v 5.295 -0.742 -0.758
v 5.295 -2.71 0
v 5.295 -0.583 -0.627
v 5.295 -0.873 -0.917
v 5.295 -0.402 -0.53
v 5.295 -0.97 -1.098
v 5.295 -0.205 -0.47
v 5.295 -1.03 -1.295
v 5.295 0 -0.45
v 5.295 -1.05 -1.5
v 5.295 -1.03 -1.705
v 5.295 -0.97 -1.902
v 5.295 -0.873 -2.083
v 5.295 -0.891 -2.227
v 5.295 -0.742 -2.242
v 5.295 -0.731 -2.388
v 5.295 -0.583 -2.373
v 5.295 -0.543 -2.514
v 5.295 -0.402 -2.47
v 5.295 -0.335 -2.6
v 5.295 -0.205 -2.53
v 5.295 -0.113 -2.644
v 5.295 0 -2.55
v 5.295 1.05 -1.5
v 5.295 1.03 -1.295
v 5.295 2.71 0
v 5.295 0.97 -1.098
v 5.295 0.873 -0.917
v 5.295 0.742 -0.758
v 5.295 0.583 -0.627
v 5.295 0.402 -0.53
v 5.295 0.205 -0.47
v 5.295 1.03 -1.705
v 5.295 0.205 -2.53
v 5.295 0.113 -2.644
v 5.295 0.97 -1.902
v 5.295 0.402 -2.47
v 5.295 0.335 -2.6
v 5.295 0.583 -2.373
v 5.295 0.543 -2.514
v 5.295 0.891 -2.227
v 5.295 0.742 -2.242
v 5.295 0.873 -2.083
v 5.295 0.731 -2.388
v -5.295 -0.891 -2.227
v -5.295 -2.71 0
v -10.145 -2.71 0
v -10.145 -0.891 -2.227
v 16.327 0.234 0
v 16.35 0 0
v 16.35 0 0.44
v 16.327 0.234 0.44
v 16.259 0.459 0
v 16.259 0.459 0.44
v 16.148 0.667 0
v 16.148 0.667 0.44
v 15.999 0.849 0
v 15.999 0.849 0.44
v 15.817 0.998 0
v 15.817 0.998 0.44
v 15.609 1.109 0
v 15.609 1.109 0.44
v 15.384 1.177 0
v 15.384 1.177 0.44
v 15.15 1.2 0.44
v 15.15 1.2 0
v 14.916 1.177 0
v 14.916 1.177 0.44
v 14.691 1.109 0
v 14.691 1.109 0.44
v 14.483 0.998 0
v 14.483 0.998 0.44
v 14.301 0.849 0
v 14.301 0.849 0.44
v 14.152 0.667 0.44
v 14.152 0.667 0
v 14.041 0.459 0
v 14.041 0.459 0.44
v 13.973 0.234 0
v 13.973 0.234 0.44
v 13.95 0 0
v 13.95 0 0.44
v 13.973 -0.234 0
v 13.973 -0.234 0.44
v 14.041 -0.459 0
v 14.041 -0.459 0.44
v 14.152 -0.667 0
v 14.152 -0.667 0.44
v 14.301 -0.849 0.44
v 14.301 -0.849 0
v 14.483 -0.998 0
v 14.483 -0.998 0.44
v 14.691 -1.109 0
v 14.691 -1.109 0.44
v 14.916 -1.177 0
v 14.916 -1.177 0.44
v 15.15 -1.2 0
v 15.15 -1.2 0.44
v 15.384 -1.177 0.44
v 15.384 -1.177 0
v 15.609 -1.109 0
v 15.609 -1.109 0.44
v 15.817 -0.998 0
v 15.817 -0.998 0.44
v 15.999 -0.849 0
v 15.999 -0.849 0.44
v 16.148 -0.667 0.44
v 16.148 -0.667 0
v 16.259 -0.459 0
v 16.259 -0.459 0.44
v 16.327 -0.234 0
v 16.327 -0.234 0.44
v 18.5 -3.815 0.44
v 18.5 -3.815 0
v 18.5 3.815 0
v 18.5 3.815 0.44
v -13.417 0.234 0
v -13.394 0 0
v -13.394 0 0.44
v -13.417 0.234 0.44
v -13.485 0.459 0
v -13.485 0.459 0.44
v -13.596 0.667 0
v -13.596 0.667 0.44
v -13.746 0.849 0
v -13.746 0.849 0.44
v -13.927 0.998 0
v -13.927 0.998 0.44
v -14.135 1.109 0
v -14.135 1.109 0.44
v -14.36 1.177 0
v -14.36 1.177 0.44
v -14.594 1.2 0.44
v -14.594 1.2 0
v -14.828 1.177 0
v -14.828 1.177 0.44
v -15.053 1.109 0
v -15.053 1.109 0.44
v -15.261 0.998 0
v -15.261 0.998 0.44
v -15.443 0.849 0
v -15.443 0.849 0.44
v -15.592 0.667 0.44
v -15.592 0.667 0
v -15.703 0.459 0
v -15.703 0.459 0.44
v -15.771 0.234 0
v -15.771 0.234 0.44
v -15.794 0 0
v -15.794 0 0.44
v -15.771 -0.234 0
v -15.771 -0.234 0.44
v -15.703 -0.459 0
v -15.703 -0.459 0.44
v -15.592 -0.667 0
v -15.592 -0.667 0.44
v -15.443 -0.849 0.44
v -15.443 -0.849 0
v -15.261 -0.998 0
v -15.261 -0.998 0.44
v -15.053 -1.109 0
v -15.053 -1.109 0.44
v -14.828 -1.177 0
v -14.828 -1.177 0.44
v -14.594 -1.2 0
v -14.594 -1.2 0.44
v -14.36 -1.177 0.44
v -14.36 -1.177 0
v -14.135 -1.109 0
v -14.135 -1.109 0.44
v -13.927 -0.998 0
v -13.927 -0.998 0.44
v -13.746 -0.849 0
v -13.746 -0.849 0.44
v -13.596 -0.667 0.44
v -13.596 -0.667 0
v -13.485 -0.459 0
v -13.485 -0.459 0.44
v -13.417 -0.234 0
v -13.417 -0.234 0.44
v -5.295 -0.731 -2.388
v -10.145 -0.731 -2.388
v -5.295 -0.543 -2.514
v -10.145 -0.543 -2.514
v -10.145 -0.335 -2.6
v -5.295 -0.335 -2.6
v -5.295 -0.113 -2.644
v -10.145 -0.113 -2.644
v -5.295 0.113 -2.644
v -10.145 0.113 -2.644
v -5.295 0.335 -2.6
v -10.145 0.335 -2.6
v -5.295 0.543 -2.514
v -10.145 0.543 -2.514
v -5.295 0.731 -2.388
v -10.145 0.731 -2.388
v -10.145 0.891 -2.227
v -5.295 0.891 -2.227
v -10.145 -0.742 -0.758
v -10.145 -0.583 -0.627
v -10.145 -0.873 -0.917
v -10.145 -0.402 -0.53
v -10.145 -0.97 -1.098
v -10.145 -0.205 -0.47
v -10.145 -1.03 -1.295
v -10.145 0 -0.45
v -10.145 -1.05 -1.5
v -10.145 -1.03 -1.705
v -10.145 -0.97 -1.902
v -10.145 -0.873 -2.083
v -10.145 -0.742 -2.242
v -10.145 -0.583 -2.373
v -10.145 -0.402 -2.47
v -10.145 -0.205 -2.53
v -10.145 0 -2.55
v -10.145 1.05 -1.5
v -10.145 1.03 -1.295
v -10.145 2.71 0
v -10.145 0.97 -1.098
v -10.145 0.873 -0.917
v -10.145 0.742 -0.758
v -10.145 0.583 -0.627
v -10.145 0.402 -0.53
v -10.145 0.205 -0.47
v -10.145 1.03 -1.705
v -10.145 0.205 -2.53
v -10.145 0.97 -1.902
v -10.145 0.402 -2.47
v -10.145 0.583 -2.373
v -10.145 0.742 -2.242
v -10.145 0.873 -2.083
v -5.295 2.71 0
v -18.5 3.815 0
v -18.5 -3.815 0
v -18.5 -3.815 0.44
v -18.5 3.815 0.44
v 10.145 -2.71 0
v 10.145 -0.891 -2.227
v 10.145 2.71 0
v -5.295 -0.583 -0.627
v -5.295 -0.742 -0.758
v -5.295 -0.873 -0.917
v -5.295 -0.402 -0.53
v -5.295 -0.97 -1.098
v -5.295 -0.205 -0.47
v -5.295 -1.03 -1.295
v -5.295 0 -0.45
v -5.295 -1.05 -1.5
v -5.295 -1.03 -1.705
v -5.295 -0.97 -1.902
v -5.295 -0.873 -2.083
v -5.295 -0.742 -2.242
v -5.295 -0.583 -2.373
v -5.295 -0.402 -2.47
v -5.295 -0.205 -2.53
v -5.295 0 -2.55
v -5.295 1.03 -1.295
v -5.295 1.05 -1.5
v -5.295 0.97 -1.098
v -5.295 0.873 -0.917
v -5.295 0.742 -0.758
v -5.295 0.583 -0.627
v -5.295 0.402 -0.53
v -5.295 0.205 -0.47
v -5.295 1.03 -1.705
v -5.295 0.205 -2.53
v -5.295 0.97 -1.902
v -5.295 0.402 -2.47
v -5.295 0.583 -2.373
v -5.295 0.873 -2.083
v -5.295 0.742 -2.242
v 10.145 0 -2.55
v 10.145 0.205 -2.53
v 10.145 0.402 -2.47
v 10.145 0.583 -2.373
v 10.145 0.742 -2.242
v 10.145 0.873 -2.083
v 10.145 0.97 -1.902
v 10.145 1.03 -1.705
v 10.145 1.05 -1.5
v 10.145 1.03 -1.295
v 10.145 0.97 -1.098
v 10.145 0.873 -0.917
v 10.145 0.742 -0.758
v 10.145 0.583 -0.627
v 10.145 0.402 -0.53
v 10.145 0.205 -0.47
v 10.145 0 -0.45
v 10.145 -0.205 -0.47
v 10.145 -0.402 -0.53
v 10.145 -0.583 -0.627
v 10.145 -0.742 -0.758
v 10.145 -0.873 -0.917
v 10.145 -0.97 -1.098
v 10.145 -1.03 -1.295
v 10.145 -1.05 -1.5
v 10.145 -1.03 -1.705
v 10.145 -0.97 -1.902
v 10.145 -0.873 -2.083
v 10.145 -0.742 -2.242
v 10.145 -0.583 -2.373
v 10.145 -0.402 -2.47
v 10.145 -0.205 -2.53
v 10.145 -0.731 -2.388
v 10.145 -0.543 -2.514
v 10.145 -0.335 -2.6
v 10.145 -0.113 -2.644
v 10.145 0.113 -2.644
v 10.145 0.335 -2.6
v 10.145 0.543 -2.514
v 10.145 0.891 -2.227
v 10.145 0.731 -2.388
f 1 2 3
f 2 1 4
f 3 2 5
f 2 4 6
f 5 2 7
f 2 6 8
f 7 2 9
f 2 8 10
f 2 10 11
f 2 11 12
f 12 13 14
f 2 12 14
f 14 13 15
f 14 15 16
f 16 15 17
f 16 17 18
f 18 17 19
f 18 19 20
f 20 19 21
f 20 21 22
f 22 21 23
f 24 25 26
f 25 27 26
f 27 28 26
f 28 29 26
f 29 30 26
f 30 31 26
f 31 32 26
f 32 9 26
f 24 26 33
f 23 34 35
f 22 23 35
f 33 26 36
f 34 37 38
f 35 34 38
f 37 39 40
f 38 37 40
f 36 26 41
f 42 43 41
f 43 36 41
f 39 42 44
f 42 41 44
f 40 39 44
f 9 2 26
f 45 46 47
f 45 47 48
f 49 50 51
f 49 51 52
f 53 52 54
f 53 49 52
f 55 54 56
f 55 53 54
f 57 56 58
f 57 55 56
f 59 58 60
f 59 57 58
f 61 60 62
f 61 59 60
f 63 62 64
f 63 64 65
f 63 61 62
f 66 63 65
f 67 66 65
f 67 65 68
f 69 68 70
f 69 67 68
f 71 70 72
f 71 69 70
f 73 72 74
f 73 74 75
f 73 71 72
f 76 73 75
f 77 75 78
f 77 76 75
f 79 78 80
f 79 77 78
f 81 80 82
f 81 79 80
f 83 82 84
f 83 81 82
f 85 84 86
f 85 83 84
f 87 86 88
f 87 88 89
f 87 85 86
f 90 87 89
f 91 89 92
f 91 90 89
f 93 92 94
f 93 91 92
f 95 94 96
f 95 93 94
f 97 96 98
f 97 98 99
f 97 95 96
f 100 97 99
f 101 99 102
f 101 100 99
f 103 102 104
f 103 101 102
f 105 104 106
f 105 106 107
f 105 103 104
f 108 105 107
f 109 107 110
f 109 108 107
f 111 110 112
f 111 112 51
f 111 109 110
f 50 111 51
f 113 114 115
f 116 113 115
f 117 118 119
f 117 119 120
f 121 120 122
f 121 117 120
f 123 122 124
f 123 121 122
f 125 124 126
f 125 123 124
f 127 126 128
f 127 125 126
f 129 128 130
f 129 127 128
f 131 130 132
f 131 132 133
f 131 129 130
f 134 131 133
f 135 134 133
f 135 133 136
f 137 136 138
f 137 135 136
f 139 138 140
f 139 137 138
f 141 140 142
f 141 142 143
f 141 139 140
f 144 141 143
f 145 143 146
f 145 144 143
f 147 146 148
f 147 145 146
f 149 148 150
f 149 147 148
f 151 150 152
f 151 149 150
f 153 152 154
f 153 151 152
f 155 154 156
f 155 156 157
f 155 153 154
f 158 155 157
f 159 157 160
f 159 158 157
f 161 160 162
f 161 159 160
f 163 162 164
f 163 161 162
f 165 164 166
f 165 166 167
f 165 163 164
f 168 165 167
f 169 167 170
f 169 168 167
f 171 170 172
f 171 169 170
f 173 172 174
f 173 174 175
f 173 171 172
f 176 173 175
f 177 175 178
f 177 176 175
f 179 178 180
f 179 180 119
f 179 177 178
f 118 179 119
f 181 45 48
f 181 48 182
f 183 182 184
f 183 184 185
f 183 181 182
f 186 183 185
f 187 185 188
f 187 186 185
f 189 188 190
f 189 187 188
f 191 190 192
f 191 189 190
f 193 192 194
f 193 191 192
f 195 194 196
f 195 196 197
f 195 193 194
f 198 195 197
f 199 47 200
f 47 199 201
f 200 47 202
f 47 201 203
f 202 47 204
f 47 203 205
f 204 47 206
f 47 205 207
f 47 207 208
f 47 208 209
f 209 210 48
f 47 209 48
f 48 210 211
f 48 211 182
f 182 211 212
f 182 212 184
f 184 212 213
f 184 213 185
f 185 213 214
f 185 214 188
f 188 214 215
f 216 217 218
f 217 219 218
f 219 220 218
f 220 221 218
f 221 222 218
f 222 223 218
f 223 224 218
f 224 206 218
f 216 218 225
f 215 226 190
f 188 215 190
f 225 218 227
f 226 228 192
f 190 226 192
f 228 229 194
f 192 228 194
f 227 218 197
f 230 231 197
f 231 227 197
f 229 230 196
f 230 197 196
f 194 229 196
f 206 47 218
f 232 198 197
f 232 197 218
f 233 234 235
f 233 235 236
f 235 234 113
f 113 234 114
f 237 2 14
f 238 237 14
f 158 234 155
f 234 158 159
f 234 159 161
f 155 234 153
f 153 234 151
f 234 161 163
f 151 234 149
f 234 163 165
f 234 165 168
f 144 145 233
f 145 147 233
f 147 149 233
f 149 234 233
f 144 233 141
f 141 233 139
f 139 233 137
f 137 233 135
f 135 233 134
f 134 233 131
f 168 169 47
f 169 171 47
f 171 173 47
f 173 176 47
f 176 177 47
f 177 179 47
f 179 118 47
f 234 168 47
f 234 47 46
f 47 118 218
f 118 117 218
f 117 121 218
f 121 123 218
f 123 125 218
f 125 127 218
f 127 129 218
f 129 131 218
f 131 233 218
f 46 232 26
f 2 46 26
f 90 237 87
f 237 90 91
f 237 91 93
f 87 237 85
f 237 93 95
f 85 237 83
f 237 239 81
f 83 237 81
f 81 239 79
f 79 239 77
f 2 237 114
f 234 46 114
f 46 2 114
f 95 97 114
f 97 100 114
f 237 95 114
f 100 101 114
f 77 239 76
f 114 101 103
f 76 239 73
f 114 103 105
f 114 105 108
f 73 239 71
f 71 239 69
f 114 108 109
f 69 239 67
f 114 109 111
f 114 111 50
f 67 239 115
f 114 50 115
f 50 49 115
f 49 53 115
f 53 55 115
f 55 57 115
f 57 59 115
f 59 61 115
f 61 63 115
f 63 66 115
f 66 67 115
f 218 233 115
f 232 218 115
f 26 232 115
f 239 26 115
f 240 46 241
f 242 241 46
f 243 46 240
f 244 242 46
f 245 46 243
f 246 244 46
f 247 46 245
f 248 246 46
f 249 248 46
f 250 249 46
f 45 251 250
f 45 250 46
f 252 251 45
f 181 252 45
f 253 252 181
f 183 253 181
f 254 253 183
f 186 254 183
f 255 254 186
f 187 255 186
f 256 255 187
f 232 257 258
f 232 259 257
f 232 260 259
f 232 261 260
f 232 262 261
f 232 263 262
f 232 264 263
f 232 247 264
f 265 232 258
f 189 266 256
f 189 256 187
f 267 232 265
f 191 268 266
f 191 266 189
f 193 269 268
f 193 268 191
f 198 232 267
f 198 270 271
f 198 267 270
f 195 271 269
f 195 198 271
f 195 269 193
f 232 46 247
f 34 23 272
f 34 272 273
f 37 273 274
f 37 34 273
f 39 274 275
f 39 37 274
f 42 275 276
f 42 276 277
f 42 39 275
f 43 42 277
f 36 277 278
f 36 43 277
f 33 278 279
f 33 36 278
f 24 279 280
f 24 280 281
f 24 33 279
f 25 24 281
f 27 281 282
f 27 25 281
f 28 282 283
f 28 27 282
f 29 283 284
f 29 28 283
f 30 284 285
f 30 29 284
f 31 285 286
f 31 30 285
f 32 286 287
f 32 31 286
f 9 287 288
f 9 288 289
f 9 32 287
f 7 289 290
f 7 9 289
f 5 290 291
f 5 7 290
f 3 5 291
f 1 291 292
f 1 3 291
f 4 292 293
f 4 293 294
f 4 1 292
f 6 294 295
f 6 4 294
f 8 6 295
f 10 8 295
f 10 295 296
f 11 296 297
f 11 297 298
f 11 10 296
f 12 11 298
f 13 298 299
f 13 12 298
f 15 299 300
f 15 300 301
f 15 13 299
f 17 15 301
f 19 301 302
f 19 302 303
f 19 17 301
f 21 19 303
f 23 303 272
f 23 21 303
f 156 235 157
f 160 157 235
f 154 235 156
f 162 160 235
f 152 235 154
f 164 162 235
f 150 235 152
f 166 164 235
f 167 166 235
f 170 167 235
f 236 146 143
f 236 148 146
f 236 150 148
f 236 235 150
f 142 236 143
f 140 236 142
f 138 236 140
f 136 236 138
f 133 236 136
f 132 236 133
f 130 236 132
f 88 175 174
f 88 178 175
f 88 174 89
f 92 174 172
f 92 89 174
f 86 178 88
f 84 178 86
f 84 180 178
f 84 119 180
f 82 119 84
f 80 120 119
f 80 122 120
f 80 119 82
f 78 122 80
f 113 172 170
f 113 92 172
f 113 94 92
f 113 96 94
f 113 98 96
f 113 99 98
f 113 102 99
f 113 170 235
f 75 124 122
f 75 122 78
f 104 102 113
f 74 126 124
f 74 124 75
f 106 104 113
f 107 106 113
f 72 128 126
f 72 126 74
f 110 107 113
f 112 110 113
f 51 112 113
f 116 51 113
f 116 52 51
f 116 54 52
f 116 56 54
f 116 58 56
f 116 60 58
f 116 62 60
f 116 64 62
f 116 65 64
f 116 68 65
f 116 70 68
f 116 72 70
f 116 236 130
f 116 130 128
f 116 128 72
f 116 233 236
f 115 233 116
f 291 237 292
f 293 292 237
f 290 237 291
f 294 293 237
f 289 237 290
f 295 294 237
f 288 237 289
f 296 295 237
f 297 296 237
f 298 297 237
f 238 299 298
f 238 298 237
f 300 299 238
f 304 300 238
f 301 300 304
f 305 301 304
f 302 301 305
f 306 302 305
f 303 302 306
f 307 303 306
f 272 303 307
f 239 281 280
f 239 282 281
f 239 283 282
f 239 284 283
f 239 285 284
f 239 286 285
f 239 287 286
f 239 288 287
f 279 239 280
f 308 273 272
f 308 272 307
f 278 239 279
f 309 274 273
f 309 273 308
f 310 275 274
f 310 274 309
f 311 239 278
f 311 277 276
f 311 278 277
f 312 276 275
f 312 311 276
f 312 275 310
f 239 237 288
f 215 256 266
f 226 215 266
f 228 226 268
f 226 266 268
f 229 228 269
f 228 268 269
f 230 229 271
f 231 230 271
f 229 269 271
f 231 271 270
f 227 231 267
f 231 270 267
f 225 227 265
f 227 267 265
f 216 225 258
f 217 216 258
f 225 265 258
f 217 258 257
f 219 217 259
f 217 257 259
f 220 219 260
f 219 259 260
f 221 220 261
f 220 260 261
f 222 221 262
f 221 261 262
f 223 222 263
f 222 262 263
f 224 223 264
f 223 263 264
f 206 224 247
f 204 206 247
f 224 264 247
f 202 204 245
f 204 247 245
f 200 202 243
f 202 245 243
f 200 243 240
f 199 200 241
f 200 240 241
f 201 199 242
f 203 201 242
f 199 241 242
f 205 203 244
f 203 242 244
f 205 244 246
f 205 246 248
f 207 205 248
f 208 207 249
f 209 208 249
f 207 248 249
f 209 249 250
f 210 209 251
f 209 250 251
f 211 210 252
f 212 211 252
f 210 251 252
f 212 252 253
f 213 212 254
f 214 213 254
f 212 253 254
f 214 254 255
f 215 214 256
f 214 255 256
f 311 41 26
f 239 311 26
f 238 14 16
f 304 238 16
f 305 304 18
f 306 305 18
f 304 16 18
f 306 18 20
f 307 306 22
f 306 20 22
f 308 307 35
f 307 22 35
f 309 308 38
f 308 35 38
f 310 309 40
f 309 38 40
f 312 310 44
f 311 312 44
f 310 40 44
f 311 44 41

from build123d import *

# Parameters (mm, degrees)
SKETCH1_W           = 37
SKETCH1_H           = 7.63
SKETCH1_R           = 1.2
BOSS_EXTRUDE1_DEPTH = 0.44
SKETCH3_R           = 1.05
BOSS_EXTRUDE2_DEPTH = 4.85


with BuildPart() as part:
    # Sketch1 → Boss-Extrude1 (new body)
    with BuildSketch(Plane.XY):
        Rectangle(SKETCH1_W, SKETCH1_H)
        with Locations((-14.59410802, 0)):
            Circle(SKETCH1_R, mode=Mode.SUBTRACT)
        with Locations((15.15, 0)):
            Circle(SKETCH1_R, mode=Mode.SUBTRACT)
    extrude(amount=BOSS_EXTRUDE1_DEPTH)

    # Sketch3 → Boss-Extrude2 (add)
    with BuildSketch(Plane(origin=(-5.295, 0, 0), x_dir=(0, 0, -1), z_dir=(1, 0, 0))):
        with BuildLine():
            Line((2.227470567, 0.890666365), (0, 2.71))
            Line((0, 2.71), (0, -2.71))
            Line((0, -2.71), (2.227470567, -0.890666365))
            ThreePointArc((2.227470567, -0.890666365), (2.65, 0), (2.227470567, 0.890666365))
        make_face()
        with Locations((1.5, 0)):
            Circle(SKETCH3_R, mode=Mode.SUBTRACT)
    boss_extrude2 = extrude(amount=-BOSS_EXTRUDE2_DEPTH)

    # Mirror1: Boss-Extrude2 across plane
    add(boss_extrude2.mirror(Plane(origin=(0, 0, 0), x_dir=(0, 0, 1), z_dir=(1, 0, 0))))


solid = part.part
